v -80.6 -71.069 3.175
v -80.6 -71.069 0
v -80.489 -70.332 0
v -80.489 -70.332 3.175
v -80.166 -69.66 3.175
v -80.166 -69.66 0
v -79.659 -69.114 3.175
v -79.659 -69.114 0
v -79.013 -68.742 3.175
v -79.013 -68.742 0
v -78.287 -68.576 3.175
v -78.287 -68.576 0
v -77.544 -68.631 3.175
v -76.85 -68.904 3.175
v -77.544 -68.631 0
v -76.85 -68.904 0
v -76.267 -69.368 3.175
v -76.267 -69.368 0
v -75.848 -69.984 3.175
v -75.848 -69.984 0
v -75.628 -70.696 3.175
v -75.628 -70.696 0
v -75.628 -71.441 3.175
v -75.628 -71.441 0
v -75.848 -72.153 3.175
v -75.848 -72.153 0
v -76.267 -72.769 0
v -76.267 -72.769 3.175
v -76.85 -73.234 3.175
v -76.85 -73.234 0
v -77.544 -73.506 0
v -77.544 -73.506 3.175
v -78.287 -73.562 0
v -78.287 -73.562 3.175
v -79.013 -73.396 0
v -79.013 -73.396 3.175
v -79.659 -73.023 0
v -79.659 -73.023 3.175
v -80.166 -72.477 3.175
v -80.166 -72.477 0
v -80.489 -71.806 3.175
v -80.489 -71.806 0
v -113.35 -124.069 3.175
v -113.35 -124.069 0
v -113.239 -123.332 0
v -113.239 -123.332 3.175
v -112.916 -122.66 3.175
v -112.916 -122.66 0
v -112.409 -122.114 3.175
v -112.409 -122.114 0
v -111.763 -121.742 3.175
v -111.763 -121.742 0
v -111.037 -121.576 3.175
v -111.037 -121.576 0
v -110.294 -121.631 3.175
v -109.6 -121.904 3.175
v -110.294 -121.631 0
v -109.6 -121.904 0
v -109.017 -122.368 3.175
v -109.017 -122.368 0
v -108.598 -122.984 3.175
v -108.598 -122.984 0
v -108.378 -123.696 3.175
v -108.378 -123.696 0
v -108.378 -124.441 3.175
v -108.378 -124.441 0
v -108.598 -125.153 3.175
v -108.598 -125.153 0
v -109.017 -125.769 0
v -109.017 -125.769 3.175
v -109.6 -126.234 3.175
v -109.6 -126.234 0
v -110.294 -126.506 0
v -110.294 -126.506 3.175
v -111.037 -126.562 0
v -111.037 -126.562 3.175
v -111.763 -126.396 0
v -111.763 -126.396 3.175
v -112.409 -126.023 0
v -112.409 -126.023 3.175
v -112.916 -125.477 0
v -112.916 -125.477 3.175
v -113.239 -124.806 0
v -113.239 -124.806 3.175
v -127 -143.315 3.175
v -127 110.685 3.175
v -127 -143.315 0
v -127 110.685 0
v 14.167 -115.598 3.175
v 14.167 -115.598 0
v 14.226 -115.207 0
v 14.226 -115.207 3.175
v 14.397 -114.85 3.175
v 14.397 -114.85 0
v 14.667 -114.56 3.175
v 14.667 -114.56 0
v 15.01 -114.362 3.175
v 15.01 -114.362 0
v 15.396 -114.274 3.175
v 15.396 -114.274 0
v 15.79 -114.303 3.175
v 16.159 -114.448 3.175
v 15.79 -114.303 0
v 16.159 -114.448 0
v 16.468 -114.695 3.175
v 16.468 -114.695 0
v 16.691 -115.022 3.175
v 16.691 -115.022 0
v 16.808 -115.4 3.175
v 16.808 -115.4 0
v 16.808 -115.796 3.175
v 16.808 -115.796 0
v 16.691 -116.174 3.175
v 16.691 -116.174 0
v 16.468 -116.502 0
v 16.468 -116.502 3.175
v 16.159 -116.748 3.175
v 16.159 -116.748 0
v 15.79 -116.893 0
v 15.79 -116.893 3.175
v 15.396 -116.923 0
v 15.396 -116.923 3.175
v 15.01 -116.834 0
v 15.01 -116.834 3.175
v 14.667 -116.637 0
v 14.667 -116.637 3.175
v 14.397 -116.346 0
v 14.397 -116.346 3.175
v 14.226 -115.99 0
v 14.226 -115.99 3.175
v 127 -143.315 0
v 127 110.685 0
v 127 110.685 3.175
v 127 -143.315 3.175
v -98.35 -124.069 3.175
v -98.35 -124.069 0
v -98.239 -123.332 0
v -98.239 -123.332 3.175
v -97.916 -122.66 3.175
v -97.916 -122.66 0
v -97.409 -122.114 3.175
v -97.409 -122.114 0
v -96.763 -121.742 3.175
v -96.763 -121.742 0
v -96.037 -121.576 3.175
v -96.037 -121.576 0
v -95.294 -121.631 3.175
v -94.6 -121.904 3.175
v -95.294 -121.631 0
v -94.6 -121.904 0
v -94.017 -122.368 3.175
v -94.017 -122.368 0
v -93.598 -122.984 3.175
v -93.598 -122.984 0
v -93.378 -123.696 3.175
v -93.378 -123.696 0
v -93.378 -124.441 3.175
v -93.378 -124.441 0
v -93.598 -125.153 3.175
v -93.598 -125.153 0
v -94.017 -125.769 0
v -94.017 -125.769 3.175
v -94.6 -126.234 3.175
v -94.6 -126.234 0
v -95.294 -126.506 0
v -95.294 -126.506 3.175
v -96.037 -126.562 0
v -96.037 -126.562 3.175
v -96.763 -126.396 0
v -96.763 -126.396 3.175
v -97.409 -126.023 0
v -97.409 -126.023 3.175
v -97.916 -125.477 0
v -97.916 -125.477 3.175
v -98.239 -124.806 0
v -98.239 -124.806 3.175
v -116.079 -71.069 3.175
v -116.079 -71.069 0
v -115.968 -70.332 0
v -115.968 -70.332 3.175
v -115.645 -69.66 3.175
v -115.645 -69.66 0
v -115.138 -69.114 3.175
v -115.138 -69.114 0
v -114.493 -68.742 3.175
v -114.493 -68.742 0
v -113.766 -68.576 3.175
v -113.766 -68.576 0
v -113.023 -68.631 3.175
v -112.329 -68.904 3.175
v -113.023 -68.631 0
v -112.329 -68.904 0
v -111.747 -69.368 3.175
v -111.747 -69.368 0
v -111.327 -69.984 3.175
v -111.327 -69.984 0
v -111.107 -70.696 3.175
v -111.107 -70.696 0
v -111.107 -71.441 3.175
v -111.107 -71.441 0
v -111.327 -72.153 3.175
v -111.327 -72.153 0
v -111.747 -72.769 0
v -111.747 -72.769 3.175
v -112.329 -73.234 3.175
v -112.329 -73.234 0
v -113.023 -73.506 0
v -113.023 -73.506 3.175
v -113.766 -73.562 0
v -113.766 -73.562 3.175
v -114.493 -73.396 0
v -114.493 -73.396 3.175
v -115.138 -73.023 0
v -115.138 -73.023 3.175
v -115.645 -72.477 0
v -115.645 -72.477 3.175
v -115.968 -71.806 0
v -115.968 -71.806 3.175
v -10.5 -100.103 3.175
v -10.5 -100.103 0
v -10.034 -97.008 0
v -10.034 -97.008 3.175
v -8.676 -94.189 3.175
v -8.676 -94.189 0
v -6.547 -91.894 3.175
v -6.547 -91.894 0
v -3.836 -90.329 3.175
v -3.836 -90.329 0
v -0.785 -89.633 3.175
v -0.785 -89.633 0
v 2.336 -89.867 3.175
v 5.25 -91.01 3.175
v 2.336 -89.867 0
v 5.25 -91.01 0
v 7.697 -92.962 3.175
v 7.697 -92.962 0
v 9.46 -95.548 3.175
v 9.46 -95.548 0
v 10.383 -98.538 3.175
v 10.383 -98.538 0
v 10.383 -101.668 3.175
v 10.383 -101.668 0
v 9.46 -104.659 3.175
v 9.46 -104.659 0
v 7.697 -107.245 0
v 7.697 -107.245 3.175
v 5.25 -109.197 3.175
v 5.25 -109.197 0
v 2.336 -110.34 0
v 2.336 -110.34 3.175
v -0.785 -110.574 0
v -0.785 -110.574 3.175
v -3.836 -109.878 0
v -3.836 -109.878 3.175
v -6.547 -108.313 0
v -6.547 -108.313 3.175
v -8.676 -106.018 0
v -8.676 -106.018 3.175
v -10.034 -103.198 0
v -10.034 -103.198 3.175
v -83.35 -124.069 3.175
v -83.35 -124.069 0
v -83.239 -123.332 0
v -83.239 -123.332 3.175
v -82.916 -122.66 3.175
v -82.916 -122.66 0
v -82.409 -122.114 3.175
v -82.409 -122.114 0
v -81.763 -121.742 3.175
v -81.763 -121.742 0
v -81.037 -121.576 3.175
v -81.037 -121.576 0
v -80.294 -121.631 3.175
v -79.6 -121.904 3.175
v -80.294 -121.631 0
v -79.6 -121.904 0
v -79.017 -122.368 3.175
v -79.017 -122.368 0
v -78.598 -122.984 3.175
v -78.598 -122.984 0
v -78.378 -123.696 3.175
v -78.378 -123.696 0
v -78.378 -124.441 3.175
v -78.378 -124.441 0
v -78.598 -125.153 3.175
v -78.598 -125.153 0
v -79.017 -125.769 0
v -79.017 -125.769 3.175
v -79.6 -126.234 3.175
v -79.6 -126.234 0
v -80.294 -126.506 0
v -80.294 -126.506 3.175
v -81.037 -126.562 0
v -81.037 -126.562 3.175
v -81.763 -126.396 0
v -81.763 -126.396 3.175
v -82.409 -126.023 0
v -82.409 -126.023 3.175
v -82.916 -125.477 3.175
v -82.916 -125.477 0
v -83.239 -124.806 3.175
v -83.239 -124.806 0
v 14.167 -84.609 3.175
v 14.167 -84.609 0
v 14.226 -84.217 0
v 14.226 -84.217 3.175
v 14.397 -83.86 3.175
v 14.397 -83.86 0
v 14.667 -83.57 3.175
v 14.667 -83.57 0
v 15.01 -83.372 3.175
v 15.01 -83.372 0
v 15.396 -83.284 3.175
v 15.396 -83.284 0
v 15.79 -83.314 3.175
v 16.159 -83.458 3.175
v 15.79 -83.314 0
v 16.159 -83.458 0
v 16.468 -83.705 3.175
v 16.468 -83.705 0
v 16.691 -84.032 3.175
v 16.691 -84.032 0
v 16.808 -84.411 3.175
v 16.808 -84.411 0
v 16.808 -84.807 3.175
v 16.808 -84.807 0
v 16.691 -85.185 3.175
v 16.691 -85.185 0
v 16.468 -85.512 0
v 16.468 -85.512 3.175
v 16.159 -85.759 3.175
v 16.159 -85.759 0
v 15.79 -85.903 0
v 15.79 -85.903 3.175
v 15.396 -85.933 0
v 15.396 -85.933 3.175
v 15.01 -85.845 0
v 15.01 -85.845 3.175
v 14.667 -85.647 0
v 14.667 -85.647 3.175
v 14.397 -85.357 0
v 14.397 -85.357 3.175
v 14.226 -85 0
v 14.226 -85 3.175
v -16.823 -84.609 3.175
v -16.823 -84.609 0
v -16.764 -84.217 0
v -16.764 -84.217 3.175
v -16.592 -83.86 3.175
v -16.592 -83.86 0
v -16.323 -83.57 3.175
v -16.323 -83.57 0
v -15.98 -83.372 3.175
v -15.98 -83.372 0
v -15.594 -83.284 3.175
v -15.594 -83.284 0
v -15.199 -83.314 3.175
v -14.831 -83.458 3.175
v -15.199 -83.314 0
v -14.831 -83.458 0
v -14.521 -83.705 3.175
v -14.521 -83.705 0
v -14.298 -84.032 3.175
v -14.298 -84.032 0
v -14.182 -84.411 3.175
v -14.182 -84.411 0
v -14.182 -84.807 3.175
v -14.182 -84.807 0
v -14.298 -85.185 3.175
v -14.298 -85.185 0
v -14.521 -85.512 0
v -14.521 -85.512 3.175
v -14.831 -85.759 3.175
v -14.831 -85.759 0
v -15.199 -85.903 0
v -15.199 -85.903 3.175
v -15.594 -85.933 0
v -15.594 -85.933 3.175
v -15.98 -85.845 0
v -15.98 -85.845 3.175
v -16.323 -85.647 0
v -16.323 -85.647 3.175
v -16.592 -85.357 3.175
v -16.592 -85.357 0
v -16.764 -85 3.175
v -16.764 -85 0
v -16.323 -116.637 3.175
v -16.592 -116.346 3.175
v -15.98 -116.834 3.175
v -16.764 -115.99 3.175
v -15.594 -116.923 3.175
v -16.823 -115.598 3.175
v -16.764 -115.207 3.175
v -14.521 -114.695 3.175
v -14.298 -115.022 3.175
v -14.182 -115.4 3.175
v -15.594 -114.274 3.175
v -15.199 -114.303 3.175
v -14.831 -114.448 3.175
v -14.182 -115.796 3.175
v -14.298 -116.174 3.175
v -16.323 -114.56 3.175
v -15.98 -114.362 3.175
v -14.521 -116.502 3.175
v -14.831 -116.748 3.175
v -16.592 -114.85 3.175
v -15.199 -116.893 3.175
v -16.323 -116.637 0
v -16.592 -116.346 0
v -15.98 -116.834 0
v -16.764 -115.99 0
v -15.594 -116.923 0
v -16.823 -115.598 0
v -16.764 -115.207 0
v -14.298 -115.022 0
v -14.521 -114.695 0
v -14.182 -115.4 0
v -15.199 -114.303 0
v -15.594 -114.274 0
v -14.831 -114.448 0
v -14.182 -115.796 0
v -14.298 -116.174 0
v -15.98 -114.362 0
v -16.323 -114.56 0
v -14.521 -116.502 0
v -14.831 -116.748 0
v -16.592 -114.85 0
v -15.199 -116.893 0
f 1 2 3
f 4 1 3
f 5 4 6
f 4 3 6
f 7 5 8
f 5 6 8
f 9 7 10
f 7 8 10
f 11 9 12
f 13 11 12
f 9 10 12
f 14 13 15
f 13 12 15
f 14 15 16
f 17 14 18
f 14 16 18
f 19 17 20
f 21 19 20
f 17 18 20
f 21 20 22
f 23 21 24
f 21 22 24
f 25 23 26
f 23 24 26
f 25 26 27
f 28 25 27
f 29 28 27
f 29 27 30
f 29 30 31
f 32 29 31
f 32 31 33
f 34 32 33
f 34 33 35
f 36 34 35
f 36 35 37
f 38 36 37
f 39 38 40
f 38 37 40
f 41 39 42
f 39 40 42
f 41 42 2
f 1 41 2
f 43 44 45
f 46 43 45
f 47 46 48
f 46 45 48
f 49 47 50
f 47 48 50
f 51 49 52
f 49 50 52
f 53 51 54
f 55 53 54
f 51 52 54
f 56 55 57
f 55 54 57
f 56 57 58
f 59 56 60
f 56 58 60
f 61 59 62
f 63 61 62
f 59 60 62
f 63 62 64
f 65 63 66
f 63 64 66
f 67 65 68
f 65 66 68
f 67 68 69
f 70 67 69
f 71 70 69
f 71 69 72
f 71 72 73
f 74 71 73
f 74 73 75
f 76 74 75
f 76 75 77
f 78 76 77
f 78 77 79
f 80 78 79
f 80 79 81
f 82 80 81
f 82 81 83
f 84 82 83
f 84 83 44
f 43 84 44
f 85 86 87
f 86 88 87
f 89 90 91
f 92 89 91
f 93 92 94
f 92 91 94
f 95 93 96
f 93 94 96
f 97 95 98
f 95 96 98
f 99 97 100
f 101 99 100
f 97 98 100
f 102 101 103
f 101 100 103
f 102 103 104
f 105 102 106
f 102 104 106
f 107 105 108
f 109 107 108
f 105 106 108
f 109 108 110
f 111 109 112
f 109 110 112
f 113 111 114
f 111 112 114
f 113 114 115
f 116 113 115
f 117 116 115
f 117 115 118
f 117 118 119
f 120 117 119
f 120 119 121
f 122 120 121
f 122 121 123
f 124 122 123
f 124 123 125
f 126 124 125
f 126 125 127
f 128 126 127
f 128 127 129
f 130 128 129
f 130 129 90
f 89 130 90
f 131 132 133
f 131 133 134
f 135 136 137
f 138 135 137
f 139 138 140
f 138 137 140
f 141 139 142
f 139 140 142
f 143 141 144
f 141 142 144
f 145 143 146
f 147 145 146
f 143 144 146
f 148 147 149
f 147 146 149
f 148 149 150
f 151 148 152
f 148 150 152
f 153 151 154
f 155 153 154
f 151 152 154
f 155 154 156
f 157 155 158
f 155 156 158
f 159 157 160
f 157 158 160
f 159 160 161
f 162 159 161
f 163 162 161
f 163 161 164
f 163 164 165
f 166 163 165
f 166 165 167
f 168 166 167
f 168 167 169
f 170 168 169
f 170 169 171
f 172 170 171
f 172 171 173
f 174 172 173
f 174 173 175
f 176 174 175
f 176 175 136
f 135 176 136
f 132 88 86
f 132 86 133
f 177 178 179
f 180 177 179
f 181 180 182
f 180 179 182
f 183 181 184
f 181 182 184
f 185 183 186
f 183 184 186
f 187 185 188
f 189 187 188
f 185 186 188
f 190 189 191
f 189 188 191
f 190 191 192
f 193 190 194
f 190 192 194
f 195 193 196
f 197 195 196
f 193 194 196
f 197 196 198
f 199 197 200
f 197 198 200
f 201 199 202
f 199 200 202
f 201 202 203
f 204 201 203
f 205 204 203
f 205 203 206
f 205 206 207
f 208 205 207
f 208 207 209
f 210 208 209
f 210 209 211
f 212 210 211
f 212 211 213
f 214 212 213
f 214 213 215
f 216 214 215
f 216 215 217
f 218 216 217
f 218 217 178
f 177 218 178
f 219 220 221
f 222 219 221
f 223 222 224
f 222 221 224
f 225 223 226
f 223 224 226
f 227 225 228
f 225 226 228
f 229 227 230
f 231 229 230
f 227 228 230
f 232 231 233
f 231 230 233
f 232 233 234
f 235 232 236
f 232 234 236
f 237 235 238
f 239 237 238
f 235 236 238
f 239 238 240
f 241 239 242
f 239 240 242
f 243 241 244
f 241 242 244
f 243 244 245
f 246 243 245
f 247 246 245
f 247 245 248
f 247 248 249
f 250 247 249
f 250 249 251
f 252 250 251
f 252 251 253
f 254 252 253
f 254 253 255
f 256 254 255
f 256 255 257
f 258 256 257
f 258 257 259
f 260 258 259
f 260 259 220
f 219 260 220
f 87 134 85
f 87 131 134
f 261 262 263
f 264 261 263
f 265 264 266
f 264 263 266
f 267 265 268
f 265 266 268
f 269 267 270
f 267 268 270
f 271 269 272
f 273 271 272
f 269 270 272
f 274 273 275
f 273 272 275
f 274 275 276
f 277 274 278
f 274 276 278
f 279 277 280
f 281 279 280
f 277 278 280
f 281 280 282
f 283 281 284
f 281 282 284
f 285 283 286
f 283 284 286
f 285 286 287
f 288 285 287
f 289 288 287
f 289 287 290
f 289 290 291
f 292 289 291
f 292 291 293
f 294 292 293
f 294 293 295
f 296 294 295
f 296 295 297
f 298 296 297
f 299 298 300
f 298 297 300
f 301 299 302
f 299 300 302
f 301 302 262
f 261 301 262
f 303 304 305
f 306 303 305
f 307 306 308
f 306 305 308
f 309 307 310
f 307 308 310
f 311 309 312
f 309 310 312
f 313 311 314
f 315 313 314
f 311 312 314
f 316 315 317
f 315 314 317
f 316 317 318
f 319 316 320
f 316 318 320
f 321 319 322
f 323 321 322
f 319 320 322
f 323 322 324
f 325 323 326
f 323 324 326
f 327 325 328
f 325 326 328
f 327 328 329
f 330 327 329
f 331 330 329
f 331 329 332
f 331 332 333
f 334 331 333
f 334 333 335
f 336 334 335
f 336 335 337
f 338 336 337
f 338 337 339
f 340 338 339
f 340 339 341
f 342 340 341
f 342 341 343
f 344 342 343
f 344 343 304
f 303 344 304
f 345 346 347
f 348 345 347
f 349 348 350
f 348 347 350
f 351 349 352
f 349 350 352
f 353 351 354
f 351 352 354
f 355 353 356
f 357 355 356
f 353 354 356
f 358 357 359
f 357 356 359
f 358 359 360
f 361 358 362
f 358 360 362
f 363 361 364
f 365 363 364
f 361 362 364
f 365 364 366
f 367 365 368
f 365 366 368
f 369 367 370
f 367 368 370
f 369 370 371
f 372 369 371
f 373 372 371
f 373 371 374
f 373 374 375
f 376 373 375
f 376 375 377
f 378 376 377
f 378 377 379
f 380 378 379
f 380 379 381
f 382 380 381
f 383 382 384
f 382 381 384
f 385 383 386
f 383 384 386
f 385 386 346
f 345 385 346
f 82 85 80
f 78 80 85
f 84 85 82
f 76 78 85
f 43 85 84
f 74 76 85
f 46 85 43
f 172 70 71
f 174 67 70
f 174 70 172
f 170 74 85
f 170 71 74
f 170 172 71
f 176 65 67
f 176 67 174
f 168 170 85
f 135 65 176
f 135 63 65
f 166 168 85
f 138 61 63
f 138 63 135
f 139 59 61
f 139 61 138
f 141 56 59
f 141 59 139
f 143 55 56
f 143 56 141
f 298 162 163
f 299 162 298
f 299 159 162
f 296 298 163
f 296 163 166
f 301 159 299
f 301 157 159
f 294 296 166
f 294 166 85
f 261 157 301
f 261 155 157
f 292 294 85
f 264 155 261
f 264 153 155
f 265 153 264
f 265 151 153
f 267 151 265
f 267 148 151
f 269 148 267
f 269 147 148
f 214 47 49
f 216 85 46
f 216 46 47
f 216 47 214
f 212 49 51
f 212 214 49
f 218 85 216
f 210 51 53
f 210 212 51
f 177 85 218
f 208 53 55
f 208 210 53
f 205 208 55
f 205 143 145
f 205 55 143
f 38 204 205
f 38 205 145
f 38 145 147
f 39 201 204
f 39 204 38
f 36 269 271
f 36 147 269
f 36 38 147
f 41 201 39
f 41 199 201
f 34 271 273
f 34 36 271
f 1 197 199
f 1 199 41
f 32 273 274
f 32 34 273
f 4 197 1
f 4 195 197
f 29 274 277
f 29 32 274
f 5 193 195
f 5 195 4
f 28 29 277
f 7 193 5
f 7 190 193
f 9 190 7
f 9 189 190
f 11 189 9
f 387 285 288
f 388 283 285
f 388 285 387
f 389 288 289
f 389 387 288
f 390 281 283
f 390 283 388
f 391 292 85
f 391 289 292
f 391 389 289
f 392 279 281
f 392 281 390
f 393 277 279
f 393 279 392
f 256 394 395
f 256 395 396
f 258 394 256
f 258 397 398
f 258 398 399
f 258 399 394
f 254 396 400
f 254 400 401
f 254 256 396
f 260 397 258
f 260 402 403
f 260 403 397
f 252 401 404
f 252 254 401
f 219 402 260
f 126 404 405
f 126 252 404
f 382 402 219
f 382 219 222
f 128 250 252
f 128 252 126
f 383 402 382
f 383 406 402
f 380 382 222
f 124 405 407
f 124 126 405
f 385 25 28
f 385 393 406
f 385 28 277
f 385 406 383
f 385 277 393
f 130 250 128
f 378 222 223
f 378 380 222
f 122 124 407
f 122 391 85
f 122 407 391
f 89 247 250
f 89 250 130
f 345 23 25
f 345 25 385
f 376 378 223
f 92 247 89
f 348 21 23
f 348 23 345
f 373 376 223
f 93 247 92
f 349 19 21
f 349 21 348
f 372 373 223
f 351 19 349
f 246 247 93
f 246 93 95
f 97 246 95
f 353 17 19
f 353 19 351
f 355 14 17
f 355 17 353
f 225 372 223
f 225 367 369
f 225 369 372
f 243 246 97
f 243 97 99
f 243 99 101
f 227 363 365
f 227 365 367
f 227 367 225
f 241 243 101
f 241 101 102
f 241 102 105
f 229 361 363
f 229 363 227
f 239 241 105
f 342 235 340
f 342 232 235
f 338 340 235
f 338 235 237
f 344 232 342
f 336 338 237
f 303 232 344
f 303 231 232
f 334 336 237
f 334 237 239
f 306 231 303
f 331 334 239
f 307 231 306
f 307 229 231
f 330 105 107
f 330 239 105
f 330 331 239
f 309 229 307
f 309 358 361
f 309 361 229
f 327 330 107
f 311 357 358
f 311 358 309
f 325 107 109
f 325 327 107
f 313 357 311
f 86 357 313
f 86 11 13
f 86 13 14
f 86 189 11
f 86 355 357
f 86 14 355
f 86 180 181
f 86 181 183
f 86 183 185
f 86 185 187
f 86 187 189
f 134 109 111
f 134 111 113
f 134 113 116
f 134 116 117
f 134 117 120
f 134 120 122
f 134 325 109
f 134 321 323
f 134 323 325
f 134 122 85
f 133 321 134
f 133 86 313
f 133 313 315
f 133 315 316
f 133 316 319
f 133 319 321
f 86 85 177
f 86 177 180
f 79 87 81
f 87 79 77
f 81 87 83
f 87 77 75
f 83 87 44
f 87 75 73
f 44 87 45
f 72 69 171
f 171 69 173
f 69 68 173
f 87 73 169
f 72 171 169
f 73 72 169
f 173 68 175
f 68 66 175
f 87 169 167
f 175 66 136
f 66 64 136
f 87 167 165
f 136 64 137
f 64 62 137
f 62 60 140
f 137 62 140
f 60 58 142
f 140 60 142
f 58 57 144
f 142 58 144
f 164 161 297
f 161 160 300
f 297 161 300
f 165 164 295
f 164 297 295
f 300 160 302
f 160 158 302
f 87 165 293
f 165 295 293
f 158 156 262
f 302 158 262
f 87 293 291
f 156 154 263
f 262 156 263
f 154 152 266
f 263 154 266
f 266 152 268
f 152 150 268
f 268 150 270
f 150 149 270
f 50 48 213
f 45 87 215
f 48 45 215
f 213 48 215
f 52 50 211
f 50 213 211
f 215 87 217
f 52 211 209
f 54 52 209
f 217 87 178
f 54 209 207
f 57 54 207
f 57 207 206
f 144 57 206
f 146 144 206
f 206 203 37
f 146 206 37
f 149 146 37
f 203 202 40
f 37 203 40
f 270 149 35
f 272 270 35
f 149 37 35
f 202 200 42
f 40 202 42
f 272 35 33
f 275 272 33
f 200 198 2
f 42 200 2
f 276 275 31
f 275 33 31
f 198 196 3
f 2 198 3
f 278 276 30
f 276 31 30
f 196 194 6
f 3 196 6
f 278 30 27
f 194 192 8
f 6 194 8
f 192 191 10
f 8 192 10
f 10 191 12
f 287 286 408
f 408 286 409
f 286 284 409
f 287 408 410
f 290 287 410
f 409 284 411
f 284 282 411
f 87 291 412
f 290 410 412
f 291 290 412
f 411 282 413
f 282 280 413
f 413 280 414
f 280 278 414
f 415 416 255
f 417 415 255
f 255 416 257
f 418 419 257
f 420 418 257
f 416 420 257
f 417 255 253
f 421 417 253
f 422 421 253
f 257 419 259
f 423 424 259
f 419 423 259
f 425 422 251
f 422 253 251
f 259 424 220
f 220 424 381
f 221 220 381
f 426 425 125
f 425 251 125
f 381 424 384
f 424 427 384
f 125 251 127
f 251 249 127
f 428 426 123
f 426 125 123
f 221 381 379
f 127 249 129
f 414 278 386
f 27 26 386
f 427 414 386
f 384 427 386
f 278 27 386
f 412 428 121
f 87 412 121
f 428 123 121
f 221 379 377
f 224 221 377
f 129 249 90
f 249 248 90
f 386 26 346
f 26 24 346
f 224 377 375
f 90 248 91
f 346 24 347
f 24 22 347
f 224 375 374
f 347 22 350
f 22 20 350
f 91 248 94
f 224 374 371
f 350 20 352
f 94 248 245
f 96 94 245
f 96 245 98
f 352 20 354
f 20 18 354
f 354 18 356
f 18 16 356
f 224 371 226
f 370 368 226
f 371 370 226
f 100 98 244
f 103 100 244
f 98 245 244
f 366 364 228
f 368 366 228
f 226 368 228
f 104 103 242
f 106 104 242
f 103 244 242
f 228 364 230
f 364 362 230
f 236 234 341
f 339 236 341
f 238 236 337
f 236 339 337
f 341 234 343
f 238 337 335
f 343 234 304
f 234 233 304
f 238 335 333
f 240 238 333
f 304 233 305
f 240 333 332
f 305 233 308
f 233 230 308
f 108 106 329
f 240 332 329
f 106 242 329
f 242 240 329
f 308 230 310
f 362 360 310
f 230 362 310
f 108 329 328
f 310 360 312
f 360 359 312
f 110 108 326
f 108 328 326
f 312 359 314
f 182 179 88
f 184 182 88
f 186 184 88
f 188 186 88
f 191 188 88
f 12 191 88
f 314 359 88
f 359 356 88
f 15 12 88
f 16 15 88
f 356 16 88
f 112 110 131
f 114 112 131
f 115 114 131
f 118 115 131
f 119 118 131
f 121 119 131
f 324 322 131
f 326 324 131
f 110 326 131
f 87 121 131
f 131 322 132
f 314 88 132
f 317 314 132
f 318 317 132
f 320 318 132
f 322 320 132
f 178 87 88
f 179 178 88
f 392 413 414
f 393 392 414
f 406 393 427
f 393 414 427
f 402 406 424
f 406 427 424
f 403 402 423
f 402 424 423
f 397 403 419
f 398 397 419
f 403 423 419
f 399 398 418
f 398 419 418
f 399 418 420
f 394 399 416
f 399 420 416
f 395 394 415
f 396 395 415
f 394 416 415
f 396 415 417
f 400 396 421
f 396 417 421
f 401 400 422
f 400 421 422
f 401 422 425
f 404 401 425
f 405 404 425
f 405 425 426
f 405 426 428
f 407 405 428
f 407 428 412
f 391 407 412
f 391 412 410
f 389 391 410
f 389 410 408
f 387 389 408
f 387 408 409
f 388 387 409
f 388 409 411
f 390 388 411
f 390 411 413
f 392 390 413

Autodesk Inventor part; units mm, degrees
ref_plane "YZ Plane" through (0, 0, 0) normal (1, 0, 0) x (0, 1, 0)
ref_plane "XZ Plane" through (0, 0, 0) normal (0, 1, 0) x (-1, 0, 0)
ref_plane "XY Plane" through (0, 0, 0) normal (0, 0, 1) x (1, 0, 0)
sketch "Sketch1" plane through (0, 0, 0) normal (0, 0, 1) x (1, 0, 0)
  line L0 (0, 110.6854) -> (-127, 110.6854)
  line L1 (-127, 110.6854) -> (-127, -143.3146)
  line L2 (-127, -143.3146) -> (0, -143.3146)
  line L3 (-127, 110.6854) -> (127, 110.6854) projected
  line L4 (-127, -143.3146) -> (-127, 110.6854) projected
  line L5 (127, -143.3146) -> (-127, -143.3146) projected
  line L6 (127, 110.6854) -> (127, -143.3146) projected
  line L7 (0, 110.6854) -> (127, 110.6854)
  line L8 (127, 110.6854) -> (127, -143.3146)
  line L9 (127, -143.3146) -> (0, -143.3146)
  circle A0 centre (15.4948, -84.6086) radius 1.3281 projected
  circle A1 centre (0, -100.1034) radius 10.5 projected
  circle A2 centre (-15.4948, -115.5982) radius 1.3281 projected
  circle A3 centre (-15.4948, -84.6086) radius 1.3281 projected
  circle A4 centre (15.4948, -115.5982) radius 1.3281 projected
  circle A5 centre (-113.85, -97.5687) radius 2.5 projected
  circle A6 centre (-77.85, -97.5687) radius 2.5 projected
  circle A7 centre (-95.85, -79.5687) radius 2.5 projected
  circle A8 centre (-95.85, -115.5687) radius 2.5 projected
  point P0 (0, 0)
  point P1 (29.6393, -143.3146)
  point P2 (-29.6393, -143.3146)
  dimension "d0" = 254
  dimension "d1" = 127
extrude "Extrusion1" add sketch "Sketch1" along normal blind 3.175 contours L3 L6 L5 L2 L1 L0 | A0 | A1 | A2 | A3 | A4 | A5 | A6 | A7 | A8
sketch "Sketch3" plane through (0, 0, 0) normal (0, 0, -1) x (-1, 0, 0)
  circle A0 centre (0, -100.1034) radius 10.5
  spline S0 degree 2 number of poles 163
  spline S1 degree 2 number of poles 163
  spline S2 degree 2 number of poles 163
  spline S3 degree 2 number of poles 163
  circle A1 centre (-15.4948, -84.6086) radius 1.3281
  circle A2 centre (15.4948, -84.6086) radius 1.3281
  circle A3 centre (15.4948, -115.5982) radius 1.3281
  circle A4 centre (-15.4948, -115.5982) radius 1.3281
  point P0 (0, 0)
  point P1 (-15.4948, -83.0805)
  point P2 (-16.4994, -85.7601)
extrude "Extrusion3" cut sketch "Sketch3" against normal up to surface (3.175 mm away)
sketch "Sketch4" plane through (0, 0, 0) normal (0, 0, -1) x (-1, 0, 0)
  circle A0 centre (110.85, -124.0687) radius 2.5 projected
  circle A1 centre (78.1, -71.0687) radius 2.5 projected
  circle A2 centre (113.5793, -71.0687) radius 2.5 projected
  circle A3 centre (110.85, -124.0687) radius 2.5 projected
  circle A4 centre (95.85, -124.0687) radius 2.5 projected
  circle A5 centre (80.85, -124.0687) radius 2.5 projected
  line L0 (117.35, -68.0687) -> (117.35, -127.0687) projected
  line L1 (111.8085, -66.0687) -> (115.35, -66.0687) projected
  line L2 (109.8085, -68.0687) -> (109.8085, -76.5687) projected
  line L3 (109.8085, -76.5687) -> (112.4358, -76.5687) projected
  arc A6 (113.1429, -76.8616) -> (112.4358, -76.5687) centre (112.4358, -77.5687) ccw projected
  line L4 (113.1429, -76.8616) -> (116.5571, -80.2758) projected
  arc A7 (116.85, -80.9829) -> (116.5571, -80.2758) centre (115.85, -80.9829) ccw projected
  line L5 (116.85, -80.9829) -> (116.85, -83.3972) projected
  line L6 (116.85, -83.3972) -> (116.4142, -82.9614) projected
  arc A8 (117, -84.3756) -> (116.4142, -82.9614) centre (115, -84.3756) ccw projected
  line L7 (117, -84.3756) -> (117, -110.7619) projected
  arc A9 (116.4142, -112.1761) -> (117, -110.7619) centre (115, -110.7619) ccw projected
  line L8 (116.4142, -112.1761) -> (116.85, -111.7403) projected
  line L9 (116.85, -111.7403) -> (116.85, -114.1545) projected
  arc A10 (116.5571, -114.8616) -> (116.85, -114.1545) centre (115.85, -114.1545) ccw projected
  line L10 (116.5571, -114.8616) -> (113.1429, -118.2758) projected
  arc A11 (112.4358, -118.5687) -> (113.1429, -118.2758) centre (112.4358, -117.5687) ccw projected
  line L11 (112.4358, -118.5687) -> (110.0216, -118.5687) projected
  line L12 (110.0216, -118.5687) -> (110.4574, -118.1329) projected
  arc A12 (109.0431, -118.7187) -> (110.4574, -118.1329) centre (109.0431, -116.7187) ccw projected
  line L13 (109.0431, -118.7187) -> (82.6569, -118.7187) projected
  arc A13 (81.8969, -118.5687) -> (82.6569, -118.7187) centre (82.6569, -116.7187) ccw projected
  line L14 (81.8969, -118.5687) -> (79.2642, -118.5687) projected
  arc A14 (78.5571, -118.2758) -> (79.2642, -118.5687) centre (79.2642, -117.5687) ccw projected
  line L15 (78.5571, -118.2758) -> (75.1429, -114.8616) projected
  arc A15 (74.85, -114.1545) -> (75.1429, -114.8616) centre (75.85, -114.1545) ccw projected
  line L16 (74.85, -114.1545) -> (74.85, -111.5218) projected
  arc A16 (74.7, -110.7619) -> (74.85, -111.5218) centre (76.7, -110.7619) ccw projected
  line L17 (74.7, -110.7619) -> (74.7, -84.3756) projected
  arc A17 (74.85, -83.6157) -> (74.7, -84.3756) centre (76.7, -84.3756) ccw projected
  line L18 (74.85, -83.6157) -> (74.85, -80.9829) projected
  arc A18 (75.1429, -80.2758) -> (74.85, -80.9829) centre (75.85, -80.9829) ccw projected
  line L19 (75.1429, -80.2758) -> (78.5571, -76.8616) projected
  arc A19 (79.2642, -76.5687) -> (78.5571, -76.8616) centre (79.2642, -77.5687) ccw projected
  line L20 (79.2642, -76.5687) -> (81.8915, -76.5687) projected
  line L21 (81.8915, -76.5687) -> (81.8915, -76.0687) projected
  line L22 (81.8915, -76.0687) -> (81.85, -76.0687) projected
  line L23 (81.85, -68.0687) -> (81.85, -76.0687) projected
  line L24 (76.35, -66.0687) -> (79.85, -66.0687) projected
  line L25 (74.35, -127.0687) -> (74.35, -68.0687) projected
  line L26 (115.35, -129.0687) -> (76.35, -129.0687) projected
  circle A20 centre (80.85, -124.0687) radius 2.5 projected
  circle A21 centre (113.5793, -71.0687) radius 2.5 projected
  circle A22 centre (78.1, -71.0687) radius 2.5 projected
  arc A23 (115.35, -129.0687) -> (117.35, -127.0687) centre (115.35, -127.0687) ccw projected
  arc A24 (117.35, -68.0687) -> (115.35, -66.0687) centre (115.35, -68.0687) ccw projected
  arc A25 (111.8085, -66.0687) -> (109.8085, -68.0687) centre (111.8085, -68.0687) ccw projected
  arc A26 (81.85, -68.0687) -> (79.85, -66.0687) centre (79.85, -68.0687) ccw projected
  arc A27 (76.35, -66.0687) -> (74.35, -68.0687) centre (76.35, -68.0687) ccw projected
  arc A28 (74.35, -127.0687) -> (76.35, -129.0687) centre (76.35, -127.0687) ccw projected
  point P0 (0, 0)
extrude "Extrusion4" cut sketch "Sketch4" against normal up to surface (3.175 mm away) contours A0 | A1 | A2 | A4 | A5
sketch "Sketch5" plane through (0, 0, 3.175) normal (0, 0, 1) x (1, 0, 0)
  circle A0 centre (-113.85, -97.5687) radius 2.5 projected
  circle A1 centre (-77.85, -97.5687) radius 2.5 projected
  circle A2 centre (-95.85, -79.5687) radius 2.5 projected
  circle A3 centre (-95.85, -115.5687) radius 2.5 projected
  circle A4 centre (15.4948, -84.6086) radius 1.3281 projected
  circle A5 centre (0, -100.1034) radius 10.5 projected
  circle A6 centre (-15.4948, -115.5982) radius 1.3281 projected
  circle A7 centre (-15.4948, -84.6086) radius 1.3281 projected
  circle A8 centre (15.4948, -115.5982) radius 1.3281 projected
  line L0 (-127, 110.6854) -> (127, 110.6854) projected
  line L1 (-127, -143.3146) -> (-127, 110.6854) projected
  line L2 (127, -143.3146) -> (-127, -143.3146) projected
  line L3 (127, 110.6854) -> (127, -143.3146) projected
  circle A9 centre (-113.85, -97.5687) radius 2.5 projected
  circle A10 centre (-77.85, -97.5687) radius 2.5 projected
  circle A11 centre (-95.85, -79.5687) radius 2.5 projected
  circle A12 centre (-95.85, -115.5687) radius 2.5 projected
  circle A13 centre (15.4948, -84.6086) radius 1.3281 projected
  circle A14 centre (0, -100.1034) radius 10.5 projected
  circle A15 centre (-15.4948, -115.5982) radius 1.3281 projected
  circle A16 centre (-15.4948, -84.6086) radius 1.3281 projected
  circle A17 centre (15.4948, -115.5982) radius 1.3281 projected
  line L4 (-127, 110.6854) -> (127, 110.6854) projected
  line L5 (-127, -143.3146) -> (-127, 110.6854) projected
  line L6 (127, -143.3146) -> (-127, -143.3146) projected
  line L7 (127, 110.6854) -> (127, -143.3146) projected
  circle A18 centre (-113.85, -97.5687) radius 2.5 projected
  circle A19 centre (-77.85, -97.5687) radius 2.5 projected
  circle A20 centre (-95.85, -79.5687) radius 2.5 projected
  circle A21 centre (-95.85, -115.5687) radius 2.5 projected
  circle A22 centre (15.4948, -84.6086) radius 1.3281 projected
  circle A23 centre (0, -100.1034) radius 10.5 projected
  circle A24 centre (-15.4948, -115.5982) radius 1.3281 projected
  circle A25 centre (-15.4948, -84.6086) radius 1.3281 projected
  circle A26 centre (15.4948, -115.5982) radius 1.3281 projected
  line L8 (-127, 110.6854) -> (127, 110.6854) projected
  line L9 (-127, -143.3146) -> (-127, 110.6854) projected
  line L10 (127, -143.3146) -> (-127, -143.3146) projected
  line L11 (127, 110.6854) -> (127, -143.3146) projected
  circle A27 centre (-113.85, -97.5687) radius 2.5 projected
  circle A28 centre (-77.85, -97.5687) radius 2.5 projected
  circle A29 centre (-95.85, -79.5687) radius 2.5 projected
  circle A30 centre (-95.85, -115.5687) radius 2.5 projected
  circle A31 centre (15.4948, -84.6086) radius 1.3281 projected
  circle A32 centre (0, -100.1034) radius 10.5 projected
  circle A33 centre (-15.4948, -115.5982) radius 1.3281 projected
  circle A34 centre (-15.4948, -84.6086) radius 1.3281 projected
  circle A35 centre (15.4948, -115.5982) radius 1.3281 projected
  line L12 (-127, 110.6854) -> (127, 110.6854) projected
  line L13 (-127, -143.3146) -> (-127, 110.6854) projected
  line L14 (127, -143.3146) -> (-127, -143.3146) projected
  line L15 (127, 110.6854) -> (127, -143.3146) projected
  circle A36 centre (-113.85, -97.5687) radius 2.5 projected
  circle A37 centre (-77.85, -97.5687) radius 2.5 projected
  circle A38 centre (-95.85, -79.5687) radius 2.5 projected
  circle A39 centre (-95.85, -115.5687) radius 2.5 projected
  circle A40 centre (15.4948, -84.6086) radius 1.3281 projected
  circle A41 centre (0, -100.1034) radius 10.5 projected
  circle A42 centre (-15.4948, -115.5982) radius 1.3281 projected
  circle A43 centre (-15.4948, -84.6086) radius 1.3281 projected
  circle A44 centre (15.4948, -115.5982) radius 1.3281 projected
  line L16 (-127, 110.6854) -> (127, 110.6854) projected
  line L17 (-127, -143.3146) -> (-127, 110.6854) projected
  line L18 (127, -143.3146) -> (-127, -143.3146) projected
  line L19 (127, 110.6854) -> (127, -143.3146) projected
  line L20 (-95.85, -97.5687) -> (-44.7057, -11.637)
  line L21 (-95.85, -97.5687) -> (4.15, -97.5687) construction
  point P0 (0, 0)
  dimension "d11" = 100
  dimension "d12" = 59.24
properties part number "LeftAlPanel" material "Aluminum 6061"
